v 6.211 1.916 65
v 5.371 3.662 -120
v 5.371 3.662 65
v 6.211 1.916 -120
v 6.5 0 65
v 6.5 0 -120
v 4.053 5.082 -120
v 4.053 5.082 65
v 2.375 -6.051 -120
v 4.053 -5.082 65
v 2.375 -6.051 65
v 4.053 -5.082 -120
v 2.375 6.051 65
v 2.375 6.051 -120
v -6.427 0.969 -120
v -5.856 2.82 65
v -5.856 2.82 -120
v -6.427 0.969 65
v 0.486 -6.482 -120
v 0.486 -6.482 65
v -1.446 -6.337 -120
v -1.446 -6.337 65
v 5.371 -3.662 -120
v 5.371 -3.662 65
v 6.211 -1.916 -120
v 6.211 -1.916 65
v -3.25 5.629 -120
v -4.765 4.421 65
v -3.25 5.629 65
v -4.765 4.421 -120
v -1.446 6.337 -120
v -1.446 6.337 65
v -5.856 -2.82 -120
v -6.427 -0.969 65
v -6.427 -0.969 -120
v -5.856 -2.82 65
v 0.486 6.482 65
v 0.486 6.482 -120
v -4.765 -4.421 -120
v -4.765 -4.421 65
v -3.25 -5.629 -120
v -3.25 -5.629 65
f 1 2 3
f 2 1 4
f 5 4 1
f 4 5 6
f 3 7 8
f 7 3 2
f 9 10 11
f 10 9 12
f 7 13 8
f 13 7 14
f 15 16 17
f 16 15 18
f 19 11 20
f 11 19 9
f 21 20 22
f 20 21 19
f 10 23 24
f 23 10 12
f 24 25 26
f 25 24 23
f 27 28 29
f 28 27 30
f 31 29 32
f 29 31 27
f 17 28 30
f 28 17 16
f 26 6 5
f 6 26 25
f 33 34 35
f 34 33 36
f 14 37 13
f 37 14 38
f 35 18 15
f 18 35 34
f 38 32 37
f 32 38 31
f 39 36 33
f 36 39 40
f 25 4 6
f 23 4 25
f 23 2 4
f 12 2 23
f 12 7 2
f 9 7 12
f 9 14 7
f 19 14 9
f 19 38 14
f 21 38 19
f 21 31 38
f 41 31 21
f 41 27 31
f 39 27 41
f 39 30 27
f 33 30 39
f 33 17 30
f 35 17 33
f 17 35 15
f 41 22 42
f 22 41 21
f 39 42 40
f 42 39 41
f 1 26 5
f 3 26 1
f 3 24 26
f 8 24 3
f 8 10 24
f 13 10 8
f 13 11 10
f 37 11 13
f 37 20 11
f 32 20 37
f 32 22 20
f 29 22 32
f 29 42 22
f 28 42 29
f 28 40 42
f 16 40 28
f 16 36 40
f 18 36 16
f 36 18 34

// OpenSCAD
module pgear()
//define
dmmy=0;  // I don't know why but it was necessary.
gmr=7; // gear gap r
gpr=6.5; //gear tooth r
nt =20;  // number of tooth
sd =5;  //shaft diameter
gd=11;  //gear diameter
ggd=12; // fringe diameter
ggdt=20; // fringe thickness
gh=185;  // gear hight
dh= 125; //Dcut hight
nf=1;   //number of fringe,  it's must be 1 or 2
off= 360/nt/2;  // tooth offset
	{
	translate([0, 0, -gh+65]) {
		difference() {
         union(){  //gear & fringe
		  translate([0, 0, 0]) cylinder(h = gh, r =gd/2-5); //gear
      if (nf == 1){
          translate([0, 0, gh-ggdt])cylinder(h = ggdt, r= ggd/2); //fringe
      				}
      if (nf == 2){
         translate([0, 0, gh-ggdt])cylinder(h = ggdt, r= ggd/2); //fringe
         translate([0, 0, 0])cylinder(h = ggdt, r= ggd/2); //fringe
                   }
                 }
		for (i = [0:(nt-1)]) { 		//gear gap
			echo(360*i/nt, sin(360*i/nt)*(gd/2-5), cos(360*i/nt)*(gd/2-5));
			translate([sin(360*i/nt)*(gd/2-5), cos(360*i/nt)*(gd/2-5), ggdt*nf*(nf-1)*0.5])
				cylinder(h = gh-ggdt*nf, r=gmr+0.5);
		                      }
		translate([0, 0, -5])  // shaft 
			cylinder(h = gh+25, r= sd/2+5);
		              }
     							}
		for (i = [0:(nt-1)]) {  // Gear tooth
			echo(360*i/nt+off, sin(360*i/nt+off)*(gd/2-5.5), cos(360*i/nt+off)*(gd/2-5.5));
			translate([sin(360*i/nt+off)*(gd/2-5.5), cos(360*i/nt+off)*(gd/2-5.5), -gh+65 ])
				cylinder(h = gh, r=gpr);
		                      }
	 // Dcut
         translate([-(sd/2*0.97), 0, dh*0.02]) cube([sd/7,sd*0.8,dh], center = true); // Dcut
     }

pgear();
